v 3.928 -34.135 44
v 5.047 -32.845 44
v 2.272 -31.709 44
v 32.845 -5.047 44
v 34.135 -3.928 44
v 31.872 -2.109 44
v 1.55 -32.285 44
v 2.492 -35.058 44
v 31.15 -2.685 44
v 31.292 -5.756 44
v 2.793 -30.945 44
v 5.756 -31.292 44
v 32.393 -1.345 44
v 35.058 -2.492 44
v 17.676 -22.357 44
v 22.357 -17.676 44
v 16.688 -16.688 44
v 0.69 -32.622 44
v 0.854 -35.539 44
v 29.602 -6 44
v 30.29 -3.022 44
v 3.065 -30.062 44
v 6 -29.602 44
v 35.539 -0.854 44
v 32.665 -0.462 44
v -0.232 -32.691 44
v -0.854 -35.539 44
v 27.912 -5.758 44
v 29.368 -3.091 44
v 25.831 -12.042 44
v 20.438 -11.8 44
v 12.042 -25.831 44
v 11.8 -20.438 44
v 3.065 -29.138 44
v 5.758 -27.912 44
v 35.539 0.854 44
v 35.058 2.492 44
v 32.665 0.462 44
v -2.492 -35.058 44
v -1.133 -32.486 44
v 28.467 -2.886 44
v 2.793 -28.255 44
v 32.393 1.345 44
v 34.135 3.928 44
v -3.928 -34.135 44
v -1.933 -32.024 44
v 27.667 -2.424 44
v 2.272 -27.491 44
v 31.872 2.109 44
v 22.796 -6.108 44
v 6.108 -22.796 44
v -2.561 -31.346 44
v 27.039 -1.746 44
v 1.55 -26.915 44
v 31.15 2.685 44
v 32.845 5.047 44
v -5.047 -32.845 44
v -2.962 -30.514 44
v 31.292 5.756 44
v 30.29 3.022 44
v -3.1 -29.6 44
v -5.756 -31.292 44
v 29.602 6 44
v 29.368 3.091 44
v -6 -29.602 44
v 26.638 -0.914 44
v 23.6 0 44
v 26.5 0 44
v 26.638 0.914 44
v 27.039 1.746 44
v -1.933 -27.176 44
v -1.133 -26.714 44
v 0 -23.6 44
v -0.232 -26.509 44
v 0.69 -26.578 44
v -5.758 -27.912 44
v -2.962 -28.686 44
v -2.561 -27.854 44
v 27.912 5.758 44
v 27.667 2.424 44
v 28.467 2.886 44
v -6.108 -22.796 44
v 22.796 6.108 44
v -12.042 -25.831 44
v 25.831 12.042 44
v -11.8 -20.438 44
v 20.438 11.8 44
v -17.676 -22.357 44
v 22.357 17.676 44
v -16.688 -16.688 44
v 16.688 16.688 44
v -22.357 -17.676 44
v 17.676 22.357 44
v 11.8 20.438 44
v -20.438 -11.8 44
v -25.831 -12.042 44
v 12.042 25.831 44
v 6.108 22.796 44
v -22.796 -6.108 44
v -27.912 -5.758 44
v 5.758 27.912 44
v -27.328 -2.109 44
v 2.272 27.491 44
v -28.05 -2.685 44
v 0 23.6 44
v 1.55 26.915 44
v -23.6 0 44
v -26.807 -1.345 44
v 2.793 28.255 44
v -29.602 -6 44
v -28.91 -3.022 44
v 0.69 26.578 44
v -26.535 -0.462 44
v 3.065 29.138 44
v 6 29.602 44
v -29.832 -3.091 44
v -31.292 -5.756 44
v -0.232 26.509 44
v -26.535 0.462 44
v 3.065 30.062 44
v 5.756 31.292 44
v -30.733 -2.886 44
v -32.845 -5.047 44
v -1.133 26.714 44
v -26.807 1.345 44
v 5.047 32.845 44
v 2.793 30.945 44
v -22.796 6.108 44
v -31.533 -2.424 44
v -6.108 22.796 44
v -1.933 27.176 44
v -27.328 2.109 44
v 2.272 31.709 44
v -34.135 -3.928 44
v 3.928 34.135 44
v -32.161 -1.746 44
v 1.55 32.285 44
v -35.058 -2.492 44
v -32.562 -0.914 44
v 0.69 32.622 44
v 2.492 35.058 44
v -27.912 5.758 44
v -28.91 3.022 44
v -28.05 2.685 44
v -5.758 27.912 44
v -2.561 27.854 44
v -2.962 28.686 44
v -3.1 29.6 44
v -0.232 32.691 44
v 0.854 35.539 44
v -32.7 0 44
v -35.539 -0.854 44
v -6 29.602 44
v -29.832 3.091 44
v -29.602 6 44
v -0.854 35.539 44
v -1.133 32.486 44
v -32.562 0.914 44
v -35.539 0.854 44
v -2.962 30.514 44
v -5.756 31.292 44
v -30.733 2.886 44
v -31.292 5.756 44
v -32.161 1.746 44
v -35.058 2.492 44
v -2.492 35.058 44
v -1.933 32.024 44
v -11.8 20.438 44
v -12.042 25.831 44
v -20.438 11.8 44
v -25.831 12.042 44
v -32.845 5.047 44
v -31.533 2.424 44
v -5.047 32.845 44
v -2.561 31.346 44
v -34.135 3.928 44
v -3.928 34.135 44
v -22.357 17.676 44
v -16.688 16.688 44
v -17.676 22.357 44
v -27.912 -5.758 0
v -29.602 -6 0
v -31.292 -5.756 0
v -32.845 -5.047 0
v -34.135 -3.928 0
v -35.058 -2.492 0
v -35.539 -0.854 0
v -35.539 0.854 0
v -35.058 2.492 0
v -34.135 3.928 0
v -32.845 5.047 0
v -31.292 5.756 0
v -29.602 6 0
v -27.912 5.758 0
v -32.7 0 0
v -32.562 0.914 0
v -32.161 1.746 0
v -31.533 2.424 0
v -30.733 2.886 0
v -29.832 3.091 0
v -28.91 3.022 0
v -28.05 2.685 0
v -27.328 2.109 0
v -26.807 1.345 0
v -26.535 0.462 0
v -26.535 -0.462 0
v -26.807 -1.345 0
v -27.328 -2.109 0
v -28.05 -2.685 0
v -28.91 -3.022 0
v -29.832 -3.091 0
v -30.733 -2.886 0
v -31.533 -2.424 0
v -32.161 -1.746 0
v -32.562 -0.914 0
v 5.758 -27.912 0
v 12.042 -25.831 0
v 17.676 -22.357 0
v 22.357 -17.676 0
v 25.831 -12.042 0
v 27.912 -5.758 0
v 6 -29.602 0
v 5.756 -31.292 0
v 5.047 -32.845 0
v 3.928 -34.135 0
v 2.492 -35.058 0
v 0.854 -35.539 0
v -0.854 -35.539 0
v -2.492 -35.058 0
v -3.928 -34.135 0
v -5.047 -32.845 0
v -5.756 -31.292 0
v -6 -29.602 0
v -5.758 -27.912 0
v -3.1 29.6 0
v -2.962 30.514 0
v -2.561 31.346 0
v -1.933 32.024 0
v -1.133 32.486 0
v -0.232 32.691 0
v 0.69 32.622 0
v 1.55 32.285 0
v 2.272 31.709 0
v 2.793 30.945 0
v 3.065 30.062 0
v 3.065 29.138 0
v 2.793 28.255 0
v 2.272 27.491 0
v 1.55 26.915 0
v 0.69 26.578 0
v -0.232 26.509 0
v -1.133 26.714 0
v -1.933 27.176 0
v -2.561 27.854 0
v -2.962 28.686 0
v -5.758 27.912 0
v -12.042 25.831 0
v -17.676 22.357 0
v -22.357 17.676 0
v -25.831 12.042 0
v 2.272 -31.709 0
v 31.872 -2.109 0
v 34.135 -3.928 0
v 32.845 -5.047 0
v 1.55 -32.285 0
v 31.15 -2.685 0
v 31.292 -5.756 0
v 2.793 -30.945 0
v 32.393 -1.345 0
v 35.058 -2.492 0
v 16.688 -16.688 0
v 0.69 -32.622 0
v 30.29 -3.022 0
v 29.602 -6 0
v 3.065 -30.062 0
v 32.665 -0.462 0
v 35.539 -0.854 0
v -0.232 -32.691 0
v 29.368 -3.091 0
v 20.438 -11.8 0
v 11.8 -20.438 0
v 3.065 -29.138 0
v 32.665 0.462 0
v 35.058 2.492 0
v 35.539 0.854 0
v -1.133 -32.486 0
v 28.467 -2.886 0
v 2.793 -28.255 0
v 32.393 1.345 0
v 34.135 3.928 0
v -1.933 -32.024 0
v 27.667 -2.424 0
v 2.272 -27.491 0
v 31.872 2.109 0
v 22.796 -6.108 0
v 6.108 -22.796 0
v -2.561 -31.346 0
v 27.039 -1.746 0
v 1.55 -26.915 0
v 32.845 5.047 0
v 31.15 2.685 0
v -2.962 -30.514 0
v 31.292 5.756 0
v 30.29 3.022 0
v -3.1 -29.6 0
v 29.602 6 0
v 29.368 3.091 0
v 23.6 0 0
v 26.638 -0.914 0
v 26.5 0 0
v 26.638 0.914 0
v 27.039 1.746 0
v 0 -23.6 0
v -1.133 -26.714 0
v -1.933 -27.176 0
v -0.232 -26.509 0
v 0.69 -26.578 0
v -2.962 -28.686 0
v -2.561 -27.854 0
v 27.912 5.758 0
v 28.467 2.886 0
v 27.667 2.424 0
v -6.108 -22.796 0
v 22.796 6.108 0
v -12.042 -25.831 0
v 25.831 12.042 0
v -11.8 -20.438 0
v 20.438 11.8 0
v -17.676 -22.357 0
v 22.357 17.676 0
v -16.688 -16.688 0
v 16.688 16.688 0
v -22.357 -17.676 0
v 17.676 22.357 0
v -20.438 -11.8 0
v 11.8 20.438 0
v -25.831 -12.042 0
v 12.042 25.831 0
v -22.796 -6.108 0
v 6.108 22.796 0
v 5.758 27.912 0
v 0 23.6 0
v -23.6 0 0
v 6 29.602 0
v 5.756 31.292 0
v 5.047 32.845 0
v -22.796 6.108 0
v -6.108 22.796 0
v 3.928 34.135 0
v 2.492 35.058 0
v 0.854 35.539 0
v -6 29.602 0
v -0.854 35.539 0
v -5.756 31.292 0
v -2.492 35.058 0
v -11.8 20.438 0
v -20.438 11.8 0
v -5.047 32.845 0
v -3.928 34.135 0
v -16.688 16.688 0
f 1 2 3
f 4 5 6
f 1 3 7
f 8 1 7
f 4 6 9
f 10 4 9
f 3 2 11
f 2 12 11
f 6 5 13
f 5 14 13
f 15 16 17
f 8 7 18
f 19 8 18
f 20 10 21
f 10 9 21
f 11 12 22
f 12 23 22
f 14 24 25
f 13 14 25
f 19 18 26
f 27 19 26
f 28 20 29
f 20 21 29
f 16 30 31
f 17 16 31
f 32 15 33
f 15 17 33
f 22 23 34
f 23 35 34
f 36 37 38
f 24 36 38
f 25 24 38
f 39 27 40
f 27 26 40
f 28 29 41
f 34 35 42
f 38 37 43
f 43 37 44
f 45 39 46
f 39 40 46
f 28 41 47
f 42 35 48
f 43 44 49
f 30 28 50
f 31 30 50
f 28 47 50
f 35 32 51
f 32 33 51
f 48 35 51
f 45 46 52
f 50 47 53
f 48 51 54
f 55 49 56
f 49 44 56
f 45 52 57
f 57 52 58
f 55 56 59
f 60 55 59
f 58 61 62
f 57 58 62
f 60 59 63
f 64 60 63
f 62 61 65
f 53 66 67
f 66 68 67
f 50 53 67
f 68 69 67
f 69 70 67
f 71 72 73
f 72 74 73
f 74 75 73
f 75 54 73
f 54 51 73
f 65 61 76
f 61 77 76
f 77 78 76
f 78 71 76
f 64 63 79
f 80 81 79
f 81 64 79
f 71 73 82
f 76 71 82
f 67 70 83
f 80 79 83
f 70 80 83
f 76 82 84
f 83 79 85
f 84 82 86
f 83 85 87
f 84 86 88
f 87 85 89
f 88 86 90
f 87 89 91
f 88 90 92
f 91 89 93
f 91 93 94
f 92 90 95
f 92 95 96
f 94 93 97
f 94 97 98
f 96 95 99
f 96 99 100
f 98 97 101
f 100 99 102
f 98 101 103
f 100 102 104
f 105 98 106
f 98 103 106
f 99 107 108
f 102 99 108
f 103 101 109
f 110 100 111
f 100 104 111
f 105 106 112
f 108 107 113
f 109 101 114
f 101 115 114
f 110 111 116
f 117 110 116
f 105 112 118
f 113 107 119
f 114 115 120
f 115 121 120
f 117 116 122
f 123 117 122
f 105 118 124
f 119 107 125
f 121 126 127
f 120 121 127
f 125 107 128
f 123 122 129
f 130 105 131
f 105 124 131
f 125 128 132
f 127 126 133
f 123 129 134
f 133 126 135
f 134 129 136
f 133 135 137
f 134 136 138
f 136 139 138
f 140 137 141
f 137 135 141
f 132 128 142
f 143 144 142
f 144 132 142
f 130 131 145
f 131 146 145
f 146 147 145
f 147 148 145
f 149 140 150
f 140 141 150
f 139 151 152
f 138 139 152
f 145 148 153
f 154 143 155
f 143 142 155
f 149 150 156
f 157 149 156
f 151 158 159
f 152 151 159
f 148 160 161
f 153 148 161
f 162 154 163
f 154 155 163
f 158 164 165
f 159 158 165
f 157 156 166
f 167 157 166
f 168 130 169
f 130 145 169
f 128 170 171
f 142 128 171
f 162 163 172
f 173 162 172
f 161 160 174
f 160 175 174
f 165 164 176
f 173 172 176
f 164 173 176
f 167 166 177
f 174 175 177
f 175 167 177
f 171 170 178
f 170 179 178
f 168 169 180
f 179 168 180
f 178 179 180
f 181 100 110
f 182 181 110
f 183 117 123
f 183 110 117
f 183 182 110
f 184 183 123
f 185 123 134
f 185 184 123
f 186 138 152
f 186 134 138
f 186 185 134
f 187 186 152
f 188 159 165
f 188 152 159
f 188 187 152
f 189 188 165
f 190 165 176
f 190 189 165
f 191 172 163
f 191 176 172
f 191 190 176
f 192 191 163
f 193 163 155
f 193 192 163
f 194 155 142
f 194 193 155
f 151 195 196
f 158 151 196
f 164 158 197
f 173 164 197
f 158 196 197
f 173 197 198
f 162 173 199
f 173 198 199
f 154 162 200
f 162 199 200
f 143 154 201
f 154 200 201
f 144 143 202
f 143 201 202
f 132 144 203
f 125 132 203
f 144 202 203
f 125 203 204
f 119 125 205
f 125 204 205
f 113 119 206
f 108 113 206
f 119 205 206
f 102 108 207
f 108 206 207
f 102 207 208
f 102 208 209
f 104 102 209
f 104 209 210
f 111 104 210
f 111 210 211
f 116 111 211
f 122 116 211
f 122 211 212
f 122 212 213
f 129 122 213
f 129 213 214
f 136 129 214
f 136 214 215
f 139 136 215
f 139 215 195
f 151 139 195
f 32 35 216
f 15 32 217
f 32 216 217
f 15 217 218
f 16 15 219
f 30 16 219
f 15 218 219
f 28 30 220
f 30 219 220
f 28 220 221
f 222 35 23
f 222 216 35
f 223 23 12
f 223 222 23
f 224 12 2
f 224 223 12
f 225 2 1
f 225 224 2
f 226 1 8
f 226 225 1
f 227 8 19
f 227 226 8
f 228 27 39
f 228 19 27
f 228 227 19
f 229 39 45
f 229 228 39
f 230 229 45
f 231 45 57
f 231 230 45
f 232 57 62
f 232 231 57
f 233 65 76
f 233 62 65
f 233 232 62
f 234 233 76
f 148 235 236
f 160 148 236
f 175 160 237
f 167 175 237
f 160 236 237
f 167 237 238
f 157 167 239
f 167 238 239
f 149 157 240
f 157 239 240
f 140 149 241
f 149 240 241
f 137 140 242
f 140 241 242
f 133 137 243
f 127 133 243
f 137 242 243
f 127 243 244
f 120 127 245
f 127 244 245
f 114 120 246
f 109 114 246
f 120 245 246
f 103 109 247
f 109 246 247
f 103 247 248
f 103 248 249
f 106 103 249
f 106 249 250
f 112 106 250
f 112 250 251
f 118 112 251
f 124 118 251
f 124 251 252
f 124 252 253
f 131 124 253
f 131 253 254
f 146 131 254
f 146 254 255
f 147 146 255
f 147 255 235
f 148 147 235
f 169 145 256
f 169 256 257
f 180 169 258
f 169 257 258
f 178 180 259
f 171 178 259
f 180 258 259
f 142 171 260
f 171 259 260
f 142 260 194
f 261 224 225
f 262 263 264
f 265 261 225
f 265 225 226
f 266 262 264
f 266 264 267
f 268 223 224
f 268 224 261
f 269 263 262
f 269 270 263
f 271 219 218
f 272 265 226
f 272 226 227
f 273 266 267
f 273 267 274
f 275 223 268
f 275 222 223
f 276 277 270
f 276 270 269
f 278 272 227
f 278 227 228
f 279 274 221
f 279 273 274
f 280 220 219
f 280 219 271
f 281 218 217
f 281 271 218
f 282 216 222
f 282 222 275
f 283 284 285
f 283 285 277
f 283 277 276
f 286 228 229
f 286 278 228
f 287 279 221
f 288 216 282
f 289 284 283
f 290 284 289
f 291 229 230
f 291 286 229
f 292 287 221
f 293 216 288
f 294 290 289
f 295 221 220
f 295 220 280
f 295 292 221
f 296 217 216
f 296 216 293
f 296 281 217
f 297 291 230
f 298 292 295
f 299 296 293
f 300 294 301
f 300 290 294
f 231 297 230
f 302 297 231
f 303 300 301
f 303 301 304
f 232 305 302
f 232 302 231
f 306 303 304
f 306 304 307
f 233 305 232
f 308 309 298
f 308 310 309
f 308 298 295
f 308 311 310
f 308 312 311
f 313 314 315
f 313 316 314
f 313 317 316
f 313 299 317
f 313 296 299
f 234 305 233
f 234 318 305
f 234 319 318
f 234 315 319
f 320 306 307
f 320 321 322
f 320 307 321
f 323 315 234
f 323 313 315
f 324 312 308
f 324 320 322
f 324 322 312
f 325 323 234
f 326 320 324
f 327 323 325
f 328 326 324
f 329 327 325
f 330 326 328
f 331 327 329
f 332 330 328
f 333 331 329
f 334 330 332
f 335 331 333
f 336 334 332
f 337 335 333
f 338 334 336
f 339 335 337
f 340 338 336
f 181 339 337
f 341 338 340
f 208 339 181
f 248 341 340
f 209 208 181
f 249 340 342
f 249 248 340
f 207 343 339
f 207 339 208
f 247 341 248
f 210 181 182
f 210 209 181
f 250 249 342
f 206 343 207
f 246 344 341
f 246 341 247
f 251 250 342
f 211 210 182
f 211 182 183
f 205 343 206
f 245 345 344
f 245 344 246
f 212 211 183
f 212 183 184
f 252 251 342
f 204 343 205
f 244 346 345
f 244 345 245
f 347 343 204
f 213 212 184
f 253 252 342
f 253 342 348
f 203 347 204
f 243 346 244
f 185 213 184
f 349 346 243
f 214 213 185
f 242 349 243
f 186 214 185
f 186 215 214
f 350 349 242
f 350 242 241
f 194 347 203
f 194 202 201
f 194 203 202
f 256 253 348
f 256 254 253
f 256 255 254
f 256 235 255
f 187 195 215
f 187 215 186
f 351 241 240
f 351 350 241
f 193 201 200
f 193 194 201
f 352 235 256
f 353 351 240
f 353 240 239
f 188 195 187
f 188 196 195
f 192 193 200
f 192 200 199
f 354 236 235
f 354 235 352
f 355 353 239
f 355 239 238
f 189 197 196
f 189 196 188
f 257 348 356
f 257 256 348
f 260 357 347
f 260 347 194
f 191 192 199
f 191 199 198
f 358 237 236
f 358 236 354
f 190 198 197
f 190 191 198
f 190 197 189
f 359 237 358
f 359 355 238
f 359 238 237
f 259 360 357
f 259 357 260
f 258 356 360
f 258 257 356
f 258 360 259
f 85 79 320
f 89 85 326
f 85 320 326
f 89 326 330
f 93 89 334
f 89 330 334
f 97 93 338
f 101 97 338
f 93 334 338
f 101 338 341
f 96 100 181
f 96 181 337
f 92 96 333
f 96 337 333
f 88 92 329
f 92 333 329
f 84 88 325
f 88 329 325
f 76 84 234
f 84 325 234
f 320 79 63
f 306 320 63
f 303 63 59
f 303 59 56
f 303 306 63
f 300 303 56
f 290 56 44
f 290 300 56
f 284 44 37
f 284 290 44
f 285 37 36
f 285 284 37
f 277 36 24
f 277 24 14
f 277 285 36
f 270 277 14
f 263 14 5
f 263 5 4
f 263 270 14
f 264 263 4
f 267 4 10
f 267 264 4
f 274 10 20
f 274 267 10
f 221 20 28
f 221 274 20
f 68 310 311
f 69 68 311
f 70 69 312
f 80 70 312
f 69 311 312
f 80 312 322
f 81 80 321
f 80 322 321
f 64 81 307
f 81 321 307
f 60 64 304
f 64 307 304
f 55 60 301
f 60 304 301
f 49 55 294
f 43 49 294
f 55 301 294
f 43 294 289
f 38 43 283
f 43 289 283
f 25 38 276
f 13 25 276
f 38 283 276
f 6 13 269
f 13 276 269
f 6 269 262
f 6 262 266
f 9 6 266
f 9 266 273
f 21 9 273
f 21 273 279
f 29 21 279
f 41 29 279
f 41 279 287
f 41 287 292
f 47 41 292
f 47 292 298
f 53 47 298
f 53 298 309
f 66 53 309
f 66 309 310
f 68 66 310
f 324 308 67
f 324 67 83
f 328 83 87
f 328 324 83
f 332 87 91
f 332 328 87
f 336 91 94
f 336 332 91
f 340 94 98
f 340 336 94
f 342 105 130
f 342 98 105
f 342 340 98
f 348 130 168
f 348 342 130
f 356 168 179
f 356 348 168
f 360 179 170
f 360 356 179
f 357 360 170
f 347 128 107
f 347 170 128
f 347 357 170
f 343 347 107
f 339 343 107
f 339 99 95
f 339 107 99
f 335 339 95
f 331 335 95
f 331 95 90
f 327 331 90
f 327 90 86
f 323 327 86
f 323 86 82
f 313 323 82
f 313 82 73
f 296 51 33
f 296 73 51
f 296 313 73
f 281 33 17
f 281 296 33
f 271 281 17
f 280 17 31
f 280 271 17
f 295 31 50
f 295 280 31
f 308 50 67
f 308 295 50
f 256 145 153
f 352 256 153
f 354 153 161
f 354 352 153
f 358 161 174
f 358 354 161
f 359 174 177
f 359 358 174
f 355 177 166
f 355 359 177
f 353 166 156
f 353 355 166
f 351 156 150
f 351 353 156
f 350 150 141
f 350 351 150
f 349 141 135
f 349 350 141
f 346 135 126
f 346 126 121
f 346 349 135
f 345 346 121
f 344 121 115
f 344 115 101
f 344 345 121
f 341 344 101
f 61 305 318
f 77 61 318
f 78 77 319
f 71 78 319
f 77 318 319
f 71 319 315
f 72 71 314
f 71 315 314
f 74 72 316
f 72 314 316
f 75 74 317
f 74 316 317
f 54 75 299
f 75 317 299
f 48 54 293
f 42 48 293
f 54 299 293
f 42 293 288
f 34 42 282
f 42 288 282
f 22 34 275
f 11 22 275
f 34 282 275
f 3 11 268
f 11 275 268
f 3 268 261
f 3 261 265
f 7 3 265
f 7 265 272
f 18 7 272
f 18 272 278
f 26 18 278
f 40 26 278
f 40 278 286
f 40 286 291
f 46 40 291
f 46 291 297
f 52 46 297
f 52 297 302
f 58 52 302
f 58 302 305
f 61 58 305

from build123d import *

# Parameters (mm, degrees)
SKETCH1_R           = 28.5
SKETCH1_R_2         = 23.6
BOSS_EXTRUDE1_DEPTH = 44
SKETCH2_R           = 6
BOSS_EXTRUDE2_DEPTH = 44
SKETCH3_R           = 3.1
CUT_EXTRUDE1_DEPTH  = 45


with BuildPart() as part:
    # Sketch1 → Boss-Extrude1 (new body)
    with BuildSketch(Plane.XY):
        Circle(SKETCH1_R)
        Circle(SKETCH1_R_2, mode=Mode.SUBTRACT)
    extrude(amount=BOSS_EXTRUDE1_DEPTH)

    # Sketch2 → Boss-Extrude2 (add)
    with BuildSketch(Plane(origin=(0, 0, 0), x_dir=(-1, 0, 0), z_dir=(0, 0, -1))):
        with Locations((0, 29.6)):
            Circle(SKETCH2_R)
        with Locations((29.6, 0)):
            Circle(SKETCH2_R)
        with Locations((0, -29.6)):
            Circle(SKETCH2_R)
        with Locations((-29.6, 0)):
            Circle(SKETCH2_R)
    extrude(amount=-BOSS_EXTRUDE2_DEPTH)

    # Sketch3 → Cut-Extrude1 (cut, through all)
    with BuildSketch(Plane(origin=(0, 0, 0), x_dir=(-1, 0, 0), z_dir=(0, 0, -1))):
        with Locations((0, 29.6)):
            Circle(SKETCH3_R)
        with Locations((29.6, 0)):
            Circle(SKETCH3_R)
        with Locations((-29.6, 0)):
            Circle(SKETCH3_R)
        with Locations((0, -29.6)):
            Circle(SKETCH3_R)
    extrude(amount=-CUT_EXTRUDE1_DEPTH, mode=Mode.SUBTRACT)


solid = part.part
